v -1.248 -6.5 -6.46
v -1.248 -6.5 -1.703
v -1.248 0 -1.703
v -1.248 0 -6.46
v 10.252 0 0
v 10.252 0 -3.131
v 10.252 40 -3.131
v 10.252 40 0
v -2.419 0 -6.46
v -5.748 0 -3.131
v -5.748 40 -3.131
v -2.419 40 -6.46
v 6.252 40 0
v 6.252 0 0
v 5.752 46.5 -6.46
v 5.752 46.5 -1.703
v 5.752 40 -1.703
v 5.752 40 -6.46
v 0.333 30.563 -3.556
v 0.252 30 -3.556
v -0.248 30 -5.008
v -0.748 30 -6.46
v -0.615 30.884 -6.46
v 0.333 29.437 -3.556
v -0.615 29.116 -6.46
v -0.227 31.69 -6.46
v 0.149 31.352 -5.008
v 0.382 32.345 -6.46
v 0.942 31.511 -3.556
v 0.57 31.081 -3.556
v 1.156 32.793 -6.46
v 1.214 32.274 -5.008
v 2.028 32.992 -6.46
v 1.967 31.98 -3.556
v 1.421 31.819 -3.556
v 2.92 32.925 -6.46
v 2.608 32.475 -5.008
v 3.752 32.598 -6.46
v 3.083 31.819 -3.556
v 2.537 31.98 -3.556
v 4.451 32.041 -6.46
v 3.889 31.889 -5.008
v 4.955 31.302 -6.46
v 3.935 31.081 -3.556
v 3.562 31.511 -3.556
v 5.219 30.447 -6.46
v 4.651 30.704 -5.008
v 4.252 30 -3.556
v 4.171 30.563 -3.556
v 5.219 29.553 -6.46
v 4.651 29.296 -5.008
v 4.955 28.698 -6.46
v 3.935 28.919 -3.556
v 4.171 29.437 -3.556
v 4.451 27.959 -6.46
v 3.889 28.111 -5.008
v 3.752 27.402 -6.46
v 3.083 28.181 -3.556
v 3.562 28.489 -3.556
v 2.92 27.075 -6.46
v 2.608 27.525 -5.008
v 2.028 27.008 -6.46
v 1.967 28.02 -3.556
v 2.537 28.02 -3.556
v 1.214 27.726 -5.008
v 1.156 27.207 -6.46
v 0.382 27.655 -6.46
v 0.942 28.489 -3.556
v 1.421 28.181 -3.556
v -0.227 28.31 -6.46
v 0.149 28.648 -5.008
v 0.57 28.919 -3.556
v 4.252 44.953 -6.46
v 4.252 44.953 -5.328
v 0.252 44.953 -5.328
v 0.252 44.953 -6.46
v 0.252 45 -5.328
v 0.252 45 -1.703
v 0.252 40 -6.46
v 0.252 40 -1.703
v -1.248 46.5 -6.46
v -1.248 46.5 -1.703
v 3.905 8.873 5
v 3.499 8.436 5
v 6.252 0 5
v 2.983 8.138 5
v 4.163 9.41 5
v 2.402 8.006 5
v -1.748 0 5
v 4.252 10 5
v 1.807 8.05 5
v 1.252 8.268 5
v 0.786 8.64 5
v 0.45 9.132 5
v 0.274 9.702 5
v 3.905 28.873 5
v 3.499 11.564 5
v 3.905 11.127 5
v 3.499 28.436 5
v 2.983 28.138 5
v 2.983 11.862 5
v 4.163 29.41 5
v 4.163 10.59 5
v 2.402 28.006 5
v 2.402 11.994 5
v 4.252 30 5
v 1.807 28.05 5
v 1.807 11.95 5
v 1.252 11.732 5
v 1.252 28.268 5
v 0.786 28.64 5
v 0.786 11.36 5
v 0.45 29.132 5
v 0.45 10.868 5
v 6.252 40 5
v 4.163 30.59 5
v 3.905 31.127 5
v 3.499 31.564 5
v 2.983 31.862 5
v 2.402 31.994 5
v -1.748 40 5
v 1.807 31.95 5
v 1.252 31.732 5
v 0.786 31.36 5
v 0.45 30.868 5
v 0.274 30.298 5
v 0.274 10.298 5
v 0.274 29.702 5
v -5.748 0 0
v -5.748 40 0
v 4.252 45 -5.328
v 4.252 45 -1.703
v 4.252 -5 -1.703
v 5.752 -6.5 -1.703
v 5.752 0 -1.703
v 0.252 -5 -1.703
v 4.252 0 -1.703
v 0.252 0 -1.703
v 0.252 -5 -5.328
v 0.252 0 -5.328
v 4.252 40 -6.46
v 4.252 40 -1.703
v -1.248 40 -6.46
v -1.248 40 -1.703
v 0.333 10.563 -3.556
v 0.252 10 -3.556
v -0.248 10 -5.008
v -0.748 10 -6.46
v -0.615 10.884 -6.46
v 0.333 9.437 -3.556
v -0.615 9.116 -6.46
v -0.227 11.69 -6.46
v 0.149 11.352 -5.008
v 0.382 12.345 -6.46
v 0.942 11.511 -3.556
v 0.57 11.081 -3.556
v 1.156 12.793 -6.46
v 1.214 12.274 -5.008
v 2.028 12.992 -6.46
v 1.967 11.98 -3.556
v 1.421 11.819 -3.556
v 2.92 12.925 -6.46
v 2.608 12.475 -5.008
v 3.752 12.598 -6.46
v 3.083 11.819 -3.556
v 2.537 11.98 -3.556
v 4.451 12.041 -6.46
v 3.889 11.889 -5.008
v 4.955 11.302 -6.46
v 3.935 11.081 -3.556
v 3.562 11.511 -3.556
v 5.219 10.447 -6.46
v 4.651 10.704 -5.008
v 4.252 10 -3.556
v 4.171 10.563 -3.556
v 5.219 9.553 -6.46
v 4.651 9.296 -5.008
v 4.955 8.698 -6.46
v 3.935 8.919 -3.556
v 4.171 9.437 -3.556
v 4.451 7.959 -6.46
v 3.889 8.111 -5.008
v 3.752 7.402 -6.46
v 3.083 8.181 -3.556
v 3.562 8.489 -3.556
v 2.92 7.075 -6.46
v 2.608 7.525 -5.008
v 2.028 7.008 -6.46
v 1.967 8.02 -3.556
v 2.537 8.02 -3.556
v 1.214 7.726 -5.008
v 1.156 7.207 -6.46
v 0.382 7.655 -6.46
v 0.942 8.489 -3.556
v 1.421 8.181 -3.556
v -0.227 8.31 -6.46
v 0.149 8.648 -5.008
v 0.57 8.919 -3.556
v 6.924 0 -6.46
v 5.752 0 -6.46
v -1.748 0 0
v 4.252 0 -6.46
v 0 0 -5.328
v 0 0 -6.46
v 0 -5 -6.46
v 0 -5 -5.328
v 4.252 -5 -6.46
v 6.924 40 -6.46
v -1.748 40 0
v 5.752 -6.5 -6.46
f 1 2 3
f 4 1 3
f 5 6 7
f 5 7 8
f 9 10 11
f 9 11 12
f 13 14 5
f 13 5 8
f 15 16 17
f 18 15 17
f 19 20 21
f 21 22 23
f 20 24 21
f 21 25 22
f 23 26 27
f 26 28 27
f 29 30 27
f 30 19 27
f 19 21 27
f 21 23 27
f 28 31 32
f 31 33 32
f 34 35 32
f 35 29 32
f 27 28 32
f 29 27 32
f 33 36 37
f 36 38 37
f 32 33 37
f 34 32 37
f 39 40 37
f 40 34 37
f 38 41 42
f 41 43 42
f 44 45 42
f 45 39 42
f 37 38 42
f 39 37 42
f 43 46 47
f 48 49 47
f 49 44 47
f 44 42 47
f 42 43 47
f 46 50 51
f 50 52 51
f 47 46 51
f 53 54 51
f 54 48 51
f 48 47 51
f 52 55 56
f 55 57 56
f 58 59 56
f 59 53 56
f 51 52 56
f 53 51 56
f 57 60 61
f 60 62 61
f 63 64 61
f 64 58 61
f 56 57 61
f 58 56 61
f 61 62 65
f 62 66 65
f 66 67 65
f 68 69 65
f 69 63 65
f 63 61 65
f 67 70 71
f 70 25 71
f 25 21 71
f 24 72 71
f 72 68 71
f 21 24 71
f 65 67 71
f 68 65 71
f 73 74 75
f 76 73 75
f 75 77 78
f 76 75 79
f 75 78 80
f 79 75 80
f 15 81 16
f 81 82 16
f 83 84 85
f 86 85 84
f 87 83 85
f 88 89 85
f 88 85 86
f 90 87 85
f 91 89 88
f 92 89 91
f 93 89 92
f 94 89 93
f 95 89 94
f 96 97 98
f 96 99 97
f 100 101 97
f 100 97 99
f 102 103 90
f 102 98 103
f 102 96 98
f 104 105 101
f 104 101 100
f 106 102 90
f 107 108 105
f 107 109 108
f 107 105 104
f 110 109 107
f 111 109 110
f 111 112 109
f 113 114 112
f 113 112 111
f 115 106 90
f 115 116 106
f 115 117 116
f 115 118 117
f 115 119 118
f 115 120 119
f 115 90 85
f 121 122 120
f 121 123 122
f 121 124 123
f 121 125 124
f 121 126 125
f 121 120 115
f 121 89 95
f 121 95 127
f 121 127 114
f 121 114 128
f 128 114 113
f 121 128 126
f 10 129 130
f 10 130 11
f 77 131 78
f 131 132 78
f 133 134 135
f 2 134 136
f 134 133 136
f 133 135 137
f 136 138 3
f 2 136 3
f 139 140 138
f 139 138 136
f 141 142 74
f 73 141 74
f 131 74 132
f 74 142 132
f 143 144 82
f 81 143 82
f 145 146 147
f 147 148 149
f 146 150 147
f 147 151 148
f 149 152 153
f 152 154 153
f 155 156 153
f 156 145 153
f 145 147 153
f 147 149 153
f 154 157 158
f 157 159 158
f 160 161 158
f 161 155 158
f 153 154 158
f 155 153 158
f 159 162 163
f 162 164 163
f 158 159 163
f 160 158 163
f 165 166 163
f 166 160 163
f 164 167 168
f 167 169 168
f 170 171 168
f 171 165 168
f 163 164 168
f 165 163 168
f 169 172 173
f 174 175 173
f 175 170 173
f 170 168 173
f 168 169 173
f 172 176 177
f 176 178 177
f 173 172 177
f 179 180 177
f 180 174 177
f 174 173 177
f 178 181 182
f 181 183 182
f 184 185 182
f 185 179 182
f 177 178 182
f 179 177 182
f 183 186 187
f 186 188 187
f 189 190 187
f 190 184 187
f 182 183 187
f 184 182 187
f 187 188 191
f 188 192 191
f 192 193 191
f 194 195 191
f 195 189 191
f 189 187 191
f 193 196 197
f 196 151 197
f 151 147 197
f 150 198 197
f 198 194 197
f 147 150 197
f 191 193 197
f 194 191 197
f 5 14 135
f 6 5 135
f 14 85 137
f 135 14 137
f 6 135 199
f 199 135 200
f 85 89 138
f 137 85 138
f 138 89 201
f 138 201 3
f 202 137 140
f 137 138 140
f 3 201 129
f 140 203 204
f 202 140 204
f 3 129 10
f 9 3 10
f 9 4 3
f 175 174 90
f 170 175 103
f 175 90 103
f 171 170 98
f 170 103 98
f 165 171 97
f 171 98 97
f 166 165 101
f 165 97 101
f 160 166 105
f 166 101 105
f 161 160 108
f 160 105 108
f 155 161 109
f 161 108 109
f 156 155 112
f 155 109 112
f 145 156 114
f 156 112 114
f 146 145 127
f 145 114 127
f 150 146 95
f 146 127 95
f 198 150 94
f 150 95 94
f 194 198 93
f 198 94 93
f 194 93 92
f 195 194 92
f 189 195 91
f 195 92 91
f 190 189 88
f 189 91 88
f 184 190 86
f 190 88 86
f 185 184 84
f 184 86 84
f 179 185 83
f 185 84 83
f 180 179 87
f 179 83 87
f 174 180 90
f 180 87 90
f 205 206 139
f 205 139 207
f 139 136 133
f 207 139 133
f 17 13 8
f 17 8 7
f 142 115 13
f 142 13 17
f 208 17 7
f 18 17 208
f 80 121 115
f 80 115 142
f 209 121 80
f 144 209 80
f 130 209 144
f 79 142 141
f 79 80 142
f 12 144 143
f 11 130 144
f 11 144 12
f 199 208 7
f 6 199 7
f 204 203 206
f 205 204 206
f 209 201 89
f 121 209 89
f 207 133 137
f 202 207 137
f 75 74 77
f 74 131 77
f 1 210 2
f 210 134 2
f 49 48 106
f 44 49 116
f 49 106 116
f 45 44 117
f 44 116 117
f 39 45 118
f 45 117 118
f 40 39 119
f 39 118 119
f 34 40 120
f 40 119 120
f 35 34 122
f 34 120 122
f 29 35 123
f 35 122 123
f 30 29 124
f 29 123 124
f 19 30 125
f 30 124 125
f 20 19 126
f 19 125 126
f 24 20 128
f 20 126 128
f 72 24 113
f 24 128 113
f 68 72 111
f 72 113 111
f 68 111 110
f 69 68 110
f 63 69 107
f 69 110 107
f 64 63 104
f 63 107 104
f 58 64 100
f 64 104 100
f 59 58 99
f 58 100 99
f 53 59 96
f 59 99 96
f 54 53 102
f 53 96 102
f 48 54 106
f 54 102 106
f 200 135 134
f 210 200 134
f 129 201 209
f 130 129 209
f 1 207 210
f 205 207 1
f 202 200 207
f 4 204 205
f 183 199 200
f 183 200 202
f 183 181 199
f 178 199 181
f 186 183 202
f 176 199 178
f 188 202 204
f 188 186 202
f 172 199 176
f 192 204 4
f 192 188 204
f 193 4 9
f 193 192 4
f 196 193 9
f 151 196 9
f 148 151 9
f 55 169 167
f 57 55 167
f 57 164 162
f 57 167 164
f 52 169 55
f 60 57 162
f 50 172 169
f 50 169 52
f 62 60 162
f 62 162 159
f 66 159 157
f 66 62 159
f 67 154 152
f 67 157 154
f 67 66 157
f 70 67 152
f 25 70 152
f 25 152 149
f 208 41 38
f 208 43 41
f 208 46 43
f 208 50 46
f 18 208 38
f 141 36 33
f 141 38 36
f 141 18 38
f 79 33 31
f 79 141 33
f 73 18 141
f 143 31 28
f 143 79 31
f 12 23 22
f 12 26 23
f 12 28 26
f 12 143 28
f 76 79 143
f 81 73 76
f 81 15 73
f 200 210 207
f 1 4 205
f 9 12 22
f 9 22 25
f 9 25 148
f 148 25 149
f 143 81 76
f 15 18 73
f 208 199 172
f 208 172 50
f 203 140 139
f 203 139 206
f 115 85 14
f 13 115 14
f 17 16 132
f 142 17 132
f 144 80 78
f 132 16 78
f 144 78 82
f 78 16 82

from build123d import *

# Parameters (mm, degrees)
BOSS_EXTRUDE1_DEPTH          = 40
SKETCH2_W                    = 3.5
SKETCH2_H                    = 40
BOSS_EXTRUDE2_DEPTH          = 5
SKETCH4_R                    = 2
CUT_EXTRUDE1_DEPTH           = 7
SKETCH5_R                    = 3.5
CUT_EXTRUDE2_DEPTH           = 3
CUT_EXTRUDE2_DRAFT           = -27
CUT_EXTRUDE2_PROFILE_2_DEPTH = 3
CUT_EXTRUDE2_PROFILE_2_DRAFT = -27
BOSS_EXTRUDE3_DEPTH          = 3
SKETCH9_W                    = 13
SKETCH9_H                    = 40
CUT_EXTRUDE4_DEPTH           = 4.702585656
SKETCH10_W                   = 15
SKETCH10_H                   = 40
BOSS_EXTRUDE4_DEPTH          = 2.5
SKETCH11_W                   = 1.5
SKETCH11_H                   = 2.202585656
BOSS_EXTRUDE7_DEPTH          = 40
BOSS_EXTRUDE8_DEPTH          = 0.625841469
SKETCH13_R                   = 2
CUT_EXTRUDE5_DEPTH           = 10
SKETCH14_W                   = 2.5
SKETCH14_H                   = 40
BOSS_EXTRUDE9_DEPTH          = 0.5
SKETCH15_W                   = 2.5
SKETCH15_H                   = 40
BOSS_EXTRUDE10_DEPTH         = 0.5
BOSS_EXTRUDE11_DEPTH         = 40
BOSS_EXTRUDE12_DEPTH         = 1.13137085
SKETCH18_R                   = 2
CUT_EXTRUDE6_DEPTH           = 10
SKETCH19_R                   = 3
CUT_EXTRUDE7_DEPTH           = 3
CUT_EXTRUDE7_DRAFT           = -19
CUT_EXTRUDE7_PROFILE_2_DEPTH = 3
CUT_EXTRUDE7_PROFILE_2_DRAFT = -19
SKETCH20_W                   = 5
SKETCH20_H                   = 40
BOSS_EXTRUDE13_DEPTH         = 0.5
SKETCH21_W                   = 5
SKETCH21_H                   = 40
BOSS_EXTRUDE14_DEPTH         = 0.5


with BuildPart() as part:
    # Sketch1 → Boss-Extrude1 (new body)
    with BuildSketch(Plane(origin=(0, 0, 0), x_dir=(1, 0, 0), z_dir=(0, 1, 0))):
        Polygon((-4.247892457, 4.702585656), (8.752107543, 4.702585656), (8.752107543, 1.702585656), (7.049521887, 0), (-2.545306801, 0), (-4.247892457, 1.702585656), align=None)
    extrude(amount=BOSS_EXTRUDE1_DEPTH)

    # Sketch2 → Boss-Extrude2 (add)
    with BuildSketch(Plane.XY):
        with Locations((4.002107543, 20)):
            Rectangle(SKETCH2_W, SKETCH2_H)
        with Locations((0.502107543, 20)):
            Rectangle(SKETCH2_W, SKETCH2_H)
    extrude(amount=BOSS_EXTRUDE2_DEPTH)

    # Sketch4 → Cut-Extrude1 (cut)
    with BuildSketch(Plane.XY.offset(5)):
        with Locations((2.252107543, 30)):
            Circle(SKETCH4_R)
        with Locations((2.252107543, 10)):
            Circle(SKETCH4_R)
    extrude(amount=-CUT_EXTRUDE1_DEPTH, mode=Mode.SUBTRACT)


with BuildPart() as cut_extrude2_tool:
    # Sketch5 → Cut-Extrude2 (with draft: the straight prism first)
    with BuildSketch(Plane(origin=(0, 0, -4.702585656), x_dir=(-1, 0, 0), z_dir=(0, 0, -1))):
        with Locations((-2.252107543, 30)):
            Circle(SKETCH5_R)
    extrude(amount=-CUT_EXTRUDE2_DEPTH)
    # Cut-Extrude2: the draft: its side faces are tilted about the plane it starts from
    cut_extrude2_sides = [cut_extrude2_tool.faces().sort_by_distance(p)[0] for p in [
        (5.752107543, 30, -3.202585656),
    ]]
    draft(cut_extrude2_sides, Plane(origin=(0, 0, -4.702585656), x_dir=(-1, 0, 0), z_dir=(0, 0, -1)), CUT_EXTRUDE2_DRAFT)


with BuildPart() as part_1:
    add(part.part)

    # Cut-Extrude2: cut by cut_extrude2_tool
    add(cut_extrude2_tool.part, mode=Mode.SUBTRACT)


with BuildPart() as cut_extrude2_profile_2_tool:
    # Sketch5 → Cut-Extrude2 profile 2 (with draft: the straight prism first)
    with BuildSketch(Plane(origin=(0, 0, -4.702585656), x_dir=(-1, 0, 0), z_dir=(0, 0, -1))):
        with Locations((-2.252107543, 10)):
            Circle(SKETCH5_R)
    extrude(amount=-CUT_EXTRUDE2_PROFILE_2_DEPTH)
    # Cut-Extrude2 profile 2: the draft: its side faces are tilted about the plane it starts from
    cut_extrude2_profile_2_sides = [cut_extrude2_profile_2_tool.faces().sort_by_distance(p)[0] for p in [
        (5.752107543, 10, -3.202585656),
    ]]
    draft(cut_extrude2_profile_2_sides, Plane(origin=(0, 0, -4.702585656), x_dir=(-1, 0, 0), z_dir=(0, 0, -1)), CUT_EXTRUDE2_PROFILE_2_DRAFT)


with BuildPart() as part_2:
    add(part_1.part)

    # Cut-Extrude2 profile 2: cut by cut_extrude2_profile_2_tool
    add(cut_extrude2_profile_2_tool.part, mode=Mode.SUBTRACT)

    # Sketch7 → Boss-Extrude3 (add)
    with BuildSketch(Plane(origin=(0, 0, -4.702585656), x_dir=(-1, 0, 0), z_dir=(0, 0, -1))):
        Polygon((1.247892457, 46.5), (-5.752107543, 46.5), (-5.752107543, 40), (-4.252107543, 40), (-4.252107543, 45), (-0.252107543, 45), (-0.252107543, 43.275204256), (-0.252107543, 40), (1.247892457, 40), align=None)
        Polygon((-4.252107543, 0), (-5.752107543, 0), (-5.752107543, -6.5), (1.247892457, -6.5), (1.247892457, 0), (-0.252107543, 0), (-0.252107543, -5), (-4.252107543, -5), align=None)
    extrude(amount=-BOSS_EXTRUDE3_DEPTH)

    # Sketch9 → Cut-Extrude4 (cut)
    with BuildSketch(Plane(origin=(0, 0, -4.702585656), x_dir=(-1, 0, 0), z_dir=(0, 0, -1))):
        with Locations((-2.252107543, 20)):
            Rectangle(SKETCH9_W, SKETCH9_H)
    extrude(amount=-CUT_EXTRUDE4_DEPTH, mode=Mode.SUBTRACT)


with BuildPart() as cut_extrude4_piece_1:
    # of the separate pieces the step leaves, piece 1, a body of its own (cut_extrude4_pieces)
    add(part_2.part.solids().sort_by_distance((-1.247892457, 0, 0))[0])



with BuildPart() as cut_extrude4_piece_2:
    # of the separate pieces the step leaves, piece 2, a body of its own (cut_extrude4_pieces)
    add(part_2.part.solids().sort_by_distance((0.252107543, 40, -4.702585656))[0])


with BuildPart() as cut_extrude4_piece_3:
    # of the separate pieces the step leaves, piece 3, a body of its own (cut_extrude4_pieces)
    add(part_2.part.solids().sort_by_distance((-1.247892457, -6.5, -4.702585656))[0])


with BuildPart() as cut_extrude4_piece_1_1:
    add(cut_extrude4_piece_1.part)

    add(cut_extrude4_piece_2.part)  # Boss-Extrude4 merges Cut-Extrude4 piece 2

    add(cut_extrude4_piece_3.part)  # Boss-Extrude4 merges Cut-Extrude4 piece 3
    # Sketch10 → Boss-Extrude4 (add)
    with BuildSketch(Plane(origin=(0, 0, 0), x_dir=(-1, 0, 0), z_dir=(0, 0, -1))):
        with Locations((-2.252107543, 20)):
            Rectangle(SKETCH10_W, SKETCH10_H)
    extrude(amount=BOSS_EXTRUDE4_DEPTH)

    # Sketch11 → Boss-Extrude7 (add)
    with BuildSketch(Plane(origin=(0, 0, 0), x_dir=(1, 0, 0), z_dir=(0, 1, 0))):
        with Locations((5.002107543, 3.601292828)):
            Rectangle(SKETCH11_W, SKETCH11_H)
        Polygon((-2.419465332, 5.328427125), (-5.247892457, 2.5), (4.252107543, 2.5), (4.252107543, 4.702585656), (5.752107543, 4.702585656), (5.752107543, 2.5), (9.752107543, 2.5), (6.923680418, 5.328427125), align=None)
    extrude(amount=BOSS_EXTRUDE7_DEPTH)

    # Sketch12 → Boss-Extrude8 (add)
    with BuildSketch(Plane(origin=(0, 0, -4.702585656), x_dir=(-1, 0, 0), z_dir=(0, 0, -1))):
        Polygon((-5.752107543, 0), (-5.752107543, -6.5), (1.247892457, -6.5), (1.247892457, 0), (-0.252107543, 0), (-0.252107543, -5), (-4.252107543, -5), (-4.252107543, 0), align=None)
        Polygon((1.247892457, 46.5), (-5.752107543, 46.5), (-5.752107543, 40), (-4.252107543, 40), (-4.252107543, 45), (-0.252107543, 45), (-0.252107543, 40), (1.247892457, 40), align=None)
    extrude(amount=BOSS_EXTRUDE8_DEPTH)

    # Sketch13 → Cut-Extrude5 (cut)
    with BuildSketch(Plane.XY):
        with Locations((2.252107543, 30)):
            Circle(SKETCH13_R)
        with Locations((2.252107543, 10)):
            Circle(SKETCH13_R)
    extrude(amount=-CUT_EXTRUDE5_DEPTH, mode=Mode.SUBTRACT)

    # Sketch14 → Boss-Extrude9 (add)
    with BuildSketch(Plane(origin=(9.752107543, 0, 0), x_dir=(0, 0, -1), z_dir=(1, 0, 0))):
        with Locations((1.25, 20)):
            Rectangle(SKETCH14_W, SKETCH14_H)
    extrude(amount=BOSS_EXTRUDE9_DEPTH)

    # Sketch15 → Boss-Extrude10 (add)
    with BuildSketch(Plane.ZY.offset(5.247892457)):
        with Locations((-1.25, 20)):
            Rectangle(SKETCH15_W, SKETCH15_H)
    extrude(amount=BOSS_EXTRUDE10_DEPTH)

    # Sketch16 → Boss-Extrude11 (add)
    with BuildSketch(Plane.XZ):
        Polygon((-2.419465332, -5.328427125), (-5.247892457, -2.5), (-5.747892457, -2.5), (-5.747892457, -3.13137085), (-2.419465332, -6.459797975), (6.923680418, -6.459797975), (10.252107543, -3.13137085), (10.252107543, -2.5), (9.752107543, -2.5), (6.923680418, -5.328427125), (0.656985658, -5.328427125), align=None)
    extrude(amount=-BOSS_EXTRUDE11_DEPTH)

    # Sketch17 → Boss-Extrude12 (add)
    with BuildSketch(Plane(origin=(0, 0, -5.328427125), x_dir=(-1, 0, 0), z_dir=(0, 0, -1))):
        Polygon((-5.752107543, 0), (-5.752107543, -6.5), (1.247892457, -6.5), (1.247892457, 0), (0, 0), (0, -5), (-0.252107543, -5), (-4.252107543, -5), (-4.252107543, 0), align=None)
        Polygon((1.247892457, 46.5), (-5.752107543, 46.5), (-5.752107543, 40), (-4.252107543, 40), (-4.252107543, 44.953142187), (-0.252107543, 44.953142187), (-0.252107543, 40), (1.247892457, 40), align=None)
    extrude(amount=BOSS_EXTRUDE12_DEPTH)

    # Sketch18 → Cut-Extrude6 (cut)
    with BuildSketch(Plane.XY.offset(-5.328427125)):
        with Locations((2.252107543, 30)):
            Circle(SKETCH18_R)
        with Locations((2.252107543, 10)):
            Circle(SKETCH18_R)
    extrude(amount=-CUT_EXTRUDE6_DEPTH, mode=Mode.SUBTRACT)


with BuildPart() as cut_extrude7_tool:
    # Sketch19 → Cut-Extrude7 (with draft: the straight prism first)
    with BuildSketch(Plane(origin=(0, 0, -6.459797975), x_dir=(-1, 0, 0), z_dir=(0, 0, -1))):
        with Locations((-2.252107543, 30)):
            Circle(SKETCH19_R)
    extrude(amount=-CUT_EXTRUDE7_DEPTH)
    # Cut-Extrude7: the draft: its side faces are tilted about the plane it starts from
    cut_extrude7_sides = [cut_extrude7_tool.faces().sort_by_distance(p)[0] for p in [
        (5.252107543, 30, -4.959797975),
    ]]
    draft(cut_extrude7_sides, Plane(origin=(0, 0, -6.459797975), x_dir=(-1, 0, 0), z_dir=(0, 0, -1)), CUT_EXTRUDE7_DRAFT)


with BuildPart() as cut_extrude4_piece_1_2:
    add(cut_extrude4_piece_1_1.part)

    # Cut-Extrude7: cut by cut_extrude7_tool
    add(cut_extrude7_tool.part, mode=Mode.SUBTRACT)


with BuildPart() as cut_extrude7_profile_2_tool:
    # Sketch19 → Cut-Extrude7 profile 2 (with draft: the straight prism first)
    with BuildSketch(Plane(origin=(0, 0, -6.459797975), x_dir=(-1, 0, 0), z_dir=(0, 0, -1))):
        with Locations((-2.252107543, 10)):
            Circle(SKETCH19_R)
    extrude(amount=-CUT_EXTRUDE7_PROFILE_2_DEPTH)
    # Cut-Extrude7 profile 2: the draft: its side faces are tilted about the plane it starts from
    cut_extrude7_profile_2_sides = [cut_extrude7_profile_2_tool.faces().sort_by_distance(p)[0] for p in [
        (5.252107543, 10, -4.959797975),
    ]]
    draft(cut_extrude7_profile_2_sides, Plane(origin=(0, 0, -6.459797975), x_dir=(-1, 0, 0), z_dir=(0, 0, -1)), CUT_EXTRUDE7_PROFILE_2_DRAFT)


with BuildPart() as cut_extrude4_piece_1_3:
    add(cut_extrude4_piece_1_2.part)

    # Cut-Extrude7 profile 2: cut by cut_extrude7_profile_2_tool
    add(cut_extrude7_profile_2_tool.part, mode=Mode.SUBTRACT)

    # Sketch20 → Boss-Extrude13 (add)
    with BuildSketch(Plane.ZY.offset(1.247892457)):
        with Locations((2.5, 20)):
            Rectangle(SKETCH20_W, SKETCH20_H)
    extrude(amount=BOSS_EXTRUDE13_DEPTH)

    # Sketch21 → Boss-Extrude14 (add)
    with BuildSketch(Plane(origin=(5.752107543, 0, 0), x_dir=(0, 0, -1), z_dir=(1, 0, 0))):
        with Locations((-2.5, 20)):
            Rectangle(SKETCH21_W, SKETCH21_H)
    extrude(amount=BOSS_EXTRUDE14_DEPTH)


solid = cut_extrude4_piece_1_3.part
